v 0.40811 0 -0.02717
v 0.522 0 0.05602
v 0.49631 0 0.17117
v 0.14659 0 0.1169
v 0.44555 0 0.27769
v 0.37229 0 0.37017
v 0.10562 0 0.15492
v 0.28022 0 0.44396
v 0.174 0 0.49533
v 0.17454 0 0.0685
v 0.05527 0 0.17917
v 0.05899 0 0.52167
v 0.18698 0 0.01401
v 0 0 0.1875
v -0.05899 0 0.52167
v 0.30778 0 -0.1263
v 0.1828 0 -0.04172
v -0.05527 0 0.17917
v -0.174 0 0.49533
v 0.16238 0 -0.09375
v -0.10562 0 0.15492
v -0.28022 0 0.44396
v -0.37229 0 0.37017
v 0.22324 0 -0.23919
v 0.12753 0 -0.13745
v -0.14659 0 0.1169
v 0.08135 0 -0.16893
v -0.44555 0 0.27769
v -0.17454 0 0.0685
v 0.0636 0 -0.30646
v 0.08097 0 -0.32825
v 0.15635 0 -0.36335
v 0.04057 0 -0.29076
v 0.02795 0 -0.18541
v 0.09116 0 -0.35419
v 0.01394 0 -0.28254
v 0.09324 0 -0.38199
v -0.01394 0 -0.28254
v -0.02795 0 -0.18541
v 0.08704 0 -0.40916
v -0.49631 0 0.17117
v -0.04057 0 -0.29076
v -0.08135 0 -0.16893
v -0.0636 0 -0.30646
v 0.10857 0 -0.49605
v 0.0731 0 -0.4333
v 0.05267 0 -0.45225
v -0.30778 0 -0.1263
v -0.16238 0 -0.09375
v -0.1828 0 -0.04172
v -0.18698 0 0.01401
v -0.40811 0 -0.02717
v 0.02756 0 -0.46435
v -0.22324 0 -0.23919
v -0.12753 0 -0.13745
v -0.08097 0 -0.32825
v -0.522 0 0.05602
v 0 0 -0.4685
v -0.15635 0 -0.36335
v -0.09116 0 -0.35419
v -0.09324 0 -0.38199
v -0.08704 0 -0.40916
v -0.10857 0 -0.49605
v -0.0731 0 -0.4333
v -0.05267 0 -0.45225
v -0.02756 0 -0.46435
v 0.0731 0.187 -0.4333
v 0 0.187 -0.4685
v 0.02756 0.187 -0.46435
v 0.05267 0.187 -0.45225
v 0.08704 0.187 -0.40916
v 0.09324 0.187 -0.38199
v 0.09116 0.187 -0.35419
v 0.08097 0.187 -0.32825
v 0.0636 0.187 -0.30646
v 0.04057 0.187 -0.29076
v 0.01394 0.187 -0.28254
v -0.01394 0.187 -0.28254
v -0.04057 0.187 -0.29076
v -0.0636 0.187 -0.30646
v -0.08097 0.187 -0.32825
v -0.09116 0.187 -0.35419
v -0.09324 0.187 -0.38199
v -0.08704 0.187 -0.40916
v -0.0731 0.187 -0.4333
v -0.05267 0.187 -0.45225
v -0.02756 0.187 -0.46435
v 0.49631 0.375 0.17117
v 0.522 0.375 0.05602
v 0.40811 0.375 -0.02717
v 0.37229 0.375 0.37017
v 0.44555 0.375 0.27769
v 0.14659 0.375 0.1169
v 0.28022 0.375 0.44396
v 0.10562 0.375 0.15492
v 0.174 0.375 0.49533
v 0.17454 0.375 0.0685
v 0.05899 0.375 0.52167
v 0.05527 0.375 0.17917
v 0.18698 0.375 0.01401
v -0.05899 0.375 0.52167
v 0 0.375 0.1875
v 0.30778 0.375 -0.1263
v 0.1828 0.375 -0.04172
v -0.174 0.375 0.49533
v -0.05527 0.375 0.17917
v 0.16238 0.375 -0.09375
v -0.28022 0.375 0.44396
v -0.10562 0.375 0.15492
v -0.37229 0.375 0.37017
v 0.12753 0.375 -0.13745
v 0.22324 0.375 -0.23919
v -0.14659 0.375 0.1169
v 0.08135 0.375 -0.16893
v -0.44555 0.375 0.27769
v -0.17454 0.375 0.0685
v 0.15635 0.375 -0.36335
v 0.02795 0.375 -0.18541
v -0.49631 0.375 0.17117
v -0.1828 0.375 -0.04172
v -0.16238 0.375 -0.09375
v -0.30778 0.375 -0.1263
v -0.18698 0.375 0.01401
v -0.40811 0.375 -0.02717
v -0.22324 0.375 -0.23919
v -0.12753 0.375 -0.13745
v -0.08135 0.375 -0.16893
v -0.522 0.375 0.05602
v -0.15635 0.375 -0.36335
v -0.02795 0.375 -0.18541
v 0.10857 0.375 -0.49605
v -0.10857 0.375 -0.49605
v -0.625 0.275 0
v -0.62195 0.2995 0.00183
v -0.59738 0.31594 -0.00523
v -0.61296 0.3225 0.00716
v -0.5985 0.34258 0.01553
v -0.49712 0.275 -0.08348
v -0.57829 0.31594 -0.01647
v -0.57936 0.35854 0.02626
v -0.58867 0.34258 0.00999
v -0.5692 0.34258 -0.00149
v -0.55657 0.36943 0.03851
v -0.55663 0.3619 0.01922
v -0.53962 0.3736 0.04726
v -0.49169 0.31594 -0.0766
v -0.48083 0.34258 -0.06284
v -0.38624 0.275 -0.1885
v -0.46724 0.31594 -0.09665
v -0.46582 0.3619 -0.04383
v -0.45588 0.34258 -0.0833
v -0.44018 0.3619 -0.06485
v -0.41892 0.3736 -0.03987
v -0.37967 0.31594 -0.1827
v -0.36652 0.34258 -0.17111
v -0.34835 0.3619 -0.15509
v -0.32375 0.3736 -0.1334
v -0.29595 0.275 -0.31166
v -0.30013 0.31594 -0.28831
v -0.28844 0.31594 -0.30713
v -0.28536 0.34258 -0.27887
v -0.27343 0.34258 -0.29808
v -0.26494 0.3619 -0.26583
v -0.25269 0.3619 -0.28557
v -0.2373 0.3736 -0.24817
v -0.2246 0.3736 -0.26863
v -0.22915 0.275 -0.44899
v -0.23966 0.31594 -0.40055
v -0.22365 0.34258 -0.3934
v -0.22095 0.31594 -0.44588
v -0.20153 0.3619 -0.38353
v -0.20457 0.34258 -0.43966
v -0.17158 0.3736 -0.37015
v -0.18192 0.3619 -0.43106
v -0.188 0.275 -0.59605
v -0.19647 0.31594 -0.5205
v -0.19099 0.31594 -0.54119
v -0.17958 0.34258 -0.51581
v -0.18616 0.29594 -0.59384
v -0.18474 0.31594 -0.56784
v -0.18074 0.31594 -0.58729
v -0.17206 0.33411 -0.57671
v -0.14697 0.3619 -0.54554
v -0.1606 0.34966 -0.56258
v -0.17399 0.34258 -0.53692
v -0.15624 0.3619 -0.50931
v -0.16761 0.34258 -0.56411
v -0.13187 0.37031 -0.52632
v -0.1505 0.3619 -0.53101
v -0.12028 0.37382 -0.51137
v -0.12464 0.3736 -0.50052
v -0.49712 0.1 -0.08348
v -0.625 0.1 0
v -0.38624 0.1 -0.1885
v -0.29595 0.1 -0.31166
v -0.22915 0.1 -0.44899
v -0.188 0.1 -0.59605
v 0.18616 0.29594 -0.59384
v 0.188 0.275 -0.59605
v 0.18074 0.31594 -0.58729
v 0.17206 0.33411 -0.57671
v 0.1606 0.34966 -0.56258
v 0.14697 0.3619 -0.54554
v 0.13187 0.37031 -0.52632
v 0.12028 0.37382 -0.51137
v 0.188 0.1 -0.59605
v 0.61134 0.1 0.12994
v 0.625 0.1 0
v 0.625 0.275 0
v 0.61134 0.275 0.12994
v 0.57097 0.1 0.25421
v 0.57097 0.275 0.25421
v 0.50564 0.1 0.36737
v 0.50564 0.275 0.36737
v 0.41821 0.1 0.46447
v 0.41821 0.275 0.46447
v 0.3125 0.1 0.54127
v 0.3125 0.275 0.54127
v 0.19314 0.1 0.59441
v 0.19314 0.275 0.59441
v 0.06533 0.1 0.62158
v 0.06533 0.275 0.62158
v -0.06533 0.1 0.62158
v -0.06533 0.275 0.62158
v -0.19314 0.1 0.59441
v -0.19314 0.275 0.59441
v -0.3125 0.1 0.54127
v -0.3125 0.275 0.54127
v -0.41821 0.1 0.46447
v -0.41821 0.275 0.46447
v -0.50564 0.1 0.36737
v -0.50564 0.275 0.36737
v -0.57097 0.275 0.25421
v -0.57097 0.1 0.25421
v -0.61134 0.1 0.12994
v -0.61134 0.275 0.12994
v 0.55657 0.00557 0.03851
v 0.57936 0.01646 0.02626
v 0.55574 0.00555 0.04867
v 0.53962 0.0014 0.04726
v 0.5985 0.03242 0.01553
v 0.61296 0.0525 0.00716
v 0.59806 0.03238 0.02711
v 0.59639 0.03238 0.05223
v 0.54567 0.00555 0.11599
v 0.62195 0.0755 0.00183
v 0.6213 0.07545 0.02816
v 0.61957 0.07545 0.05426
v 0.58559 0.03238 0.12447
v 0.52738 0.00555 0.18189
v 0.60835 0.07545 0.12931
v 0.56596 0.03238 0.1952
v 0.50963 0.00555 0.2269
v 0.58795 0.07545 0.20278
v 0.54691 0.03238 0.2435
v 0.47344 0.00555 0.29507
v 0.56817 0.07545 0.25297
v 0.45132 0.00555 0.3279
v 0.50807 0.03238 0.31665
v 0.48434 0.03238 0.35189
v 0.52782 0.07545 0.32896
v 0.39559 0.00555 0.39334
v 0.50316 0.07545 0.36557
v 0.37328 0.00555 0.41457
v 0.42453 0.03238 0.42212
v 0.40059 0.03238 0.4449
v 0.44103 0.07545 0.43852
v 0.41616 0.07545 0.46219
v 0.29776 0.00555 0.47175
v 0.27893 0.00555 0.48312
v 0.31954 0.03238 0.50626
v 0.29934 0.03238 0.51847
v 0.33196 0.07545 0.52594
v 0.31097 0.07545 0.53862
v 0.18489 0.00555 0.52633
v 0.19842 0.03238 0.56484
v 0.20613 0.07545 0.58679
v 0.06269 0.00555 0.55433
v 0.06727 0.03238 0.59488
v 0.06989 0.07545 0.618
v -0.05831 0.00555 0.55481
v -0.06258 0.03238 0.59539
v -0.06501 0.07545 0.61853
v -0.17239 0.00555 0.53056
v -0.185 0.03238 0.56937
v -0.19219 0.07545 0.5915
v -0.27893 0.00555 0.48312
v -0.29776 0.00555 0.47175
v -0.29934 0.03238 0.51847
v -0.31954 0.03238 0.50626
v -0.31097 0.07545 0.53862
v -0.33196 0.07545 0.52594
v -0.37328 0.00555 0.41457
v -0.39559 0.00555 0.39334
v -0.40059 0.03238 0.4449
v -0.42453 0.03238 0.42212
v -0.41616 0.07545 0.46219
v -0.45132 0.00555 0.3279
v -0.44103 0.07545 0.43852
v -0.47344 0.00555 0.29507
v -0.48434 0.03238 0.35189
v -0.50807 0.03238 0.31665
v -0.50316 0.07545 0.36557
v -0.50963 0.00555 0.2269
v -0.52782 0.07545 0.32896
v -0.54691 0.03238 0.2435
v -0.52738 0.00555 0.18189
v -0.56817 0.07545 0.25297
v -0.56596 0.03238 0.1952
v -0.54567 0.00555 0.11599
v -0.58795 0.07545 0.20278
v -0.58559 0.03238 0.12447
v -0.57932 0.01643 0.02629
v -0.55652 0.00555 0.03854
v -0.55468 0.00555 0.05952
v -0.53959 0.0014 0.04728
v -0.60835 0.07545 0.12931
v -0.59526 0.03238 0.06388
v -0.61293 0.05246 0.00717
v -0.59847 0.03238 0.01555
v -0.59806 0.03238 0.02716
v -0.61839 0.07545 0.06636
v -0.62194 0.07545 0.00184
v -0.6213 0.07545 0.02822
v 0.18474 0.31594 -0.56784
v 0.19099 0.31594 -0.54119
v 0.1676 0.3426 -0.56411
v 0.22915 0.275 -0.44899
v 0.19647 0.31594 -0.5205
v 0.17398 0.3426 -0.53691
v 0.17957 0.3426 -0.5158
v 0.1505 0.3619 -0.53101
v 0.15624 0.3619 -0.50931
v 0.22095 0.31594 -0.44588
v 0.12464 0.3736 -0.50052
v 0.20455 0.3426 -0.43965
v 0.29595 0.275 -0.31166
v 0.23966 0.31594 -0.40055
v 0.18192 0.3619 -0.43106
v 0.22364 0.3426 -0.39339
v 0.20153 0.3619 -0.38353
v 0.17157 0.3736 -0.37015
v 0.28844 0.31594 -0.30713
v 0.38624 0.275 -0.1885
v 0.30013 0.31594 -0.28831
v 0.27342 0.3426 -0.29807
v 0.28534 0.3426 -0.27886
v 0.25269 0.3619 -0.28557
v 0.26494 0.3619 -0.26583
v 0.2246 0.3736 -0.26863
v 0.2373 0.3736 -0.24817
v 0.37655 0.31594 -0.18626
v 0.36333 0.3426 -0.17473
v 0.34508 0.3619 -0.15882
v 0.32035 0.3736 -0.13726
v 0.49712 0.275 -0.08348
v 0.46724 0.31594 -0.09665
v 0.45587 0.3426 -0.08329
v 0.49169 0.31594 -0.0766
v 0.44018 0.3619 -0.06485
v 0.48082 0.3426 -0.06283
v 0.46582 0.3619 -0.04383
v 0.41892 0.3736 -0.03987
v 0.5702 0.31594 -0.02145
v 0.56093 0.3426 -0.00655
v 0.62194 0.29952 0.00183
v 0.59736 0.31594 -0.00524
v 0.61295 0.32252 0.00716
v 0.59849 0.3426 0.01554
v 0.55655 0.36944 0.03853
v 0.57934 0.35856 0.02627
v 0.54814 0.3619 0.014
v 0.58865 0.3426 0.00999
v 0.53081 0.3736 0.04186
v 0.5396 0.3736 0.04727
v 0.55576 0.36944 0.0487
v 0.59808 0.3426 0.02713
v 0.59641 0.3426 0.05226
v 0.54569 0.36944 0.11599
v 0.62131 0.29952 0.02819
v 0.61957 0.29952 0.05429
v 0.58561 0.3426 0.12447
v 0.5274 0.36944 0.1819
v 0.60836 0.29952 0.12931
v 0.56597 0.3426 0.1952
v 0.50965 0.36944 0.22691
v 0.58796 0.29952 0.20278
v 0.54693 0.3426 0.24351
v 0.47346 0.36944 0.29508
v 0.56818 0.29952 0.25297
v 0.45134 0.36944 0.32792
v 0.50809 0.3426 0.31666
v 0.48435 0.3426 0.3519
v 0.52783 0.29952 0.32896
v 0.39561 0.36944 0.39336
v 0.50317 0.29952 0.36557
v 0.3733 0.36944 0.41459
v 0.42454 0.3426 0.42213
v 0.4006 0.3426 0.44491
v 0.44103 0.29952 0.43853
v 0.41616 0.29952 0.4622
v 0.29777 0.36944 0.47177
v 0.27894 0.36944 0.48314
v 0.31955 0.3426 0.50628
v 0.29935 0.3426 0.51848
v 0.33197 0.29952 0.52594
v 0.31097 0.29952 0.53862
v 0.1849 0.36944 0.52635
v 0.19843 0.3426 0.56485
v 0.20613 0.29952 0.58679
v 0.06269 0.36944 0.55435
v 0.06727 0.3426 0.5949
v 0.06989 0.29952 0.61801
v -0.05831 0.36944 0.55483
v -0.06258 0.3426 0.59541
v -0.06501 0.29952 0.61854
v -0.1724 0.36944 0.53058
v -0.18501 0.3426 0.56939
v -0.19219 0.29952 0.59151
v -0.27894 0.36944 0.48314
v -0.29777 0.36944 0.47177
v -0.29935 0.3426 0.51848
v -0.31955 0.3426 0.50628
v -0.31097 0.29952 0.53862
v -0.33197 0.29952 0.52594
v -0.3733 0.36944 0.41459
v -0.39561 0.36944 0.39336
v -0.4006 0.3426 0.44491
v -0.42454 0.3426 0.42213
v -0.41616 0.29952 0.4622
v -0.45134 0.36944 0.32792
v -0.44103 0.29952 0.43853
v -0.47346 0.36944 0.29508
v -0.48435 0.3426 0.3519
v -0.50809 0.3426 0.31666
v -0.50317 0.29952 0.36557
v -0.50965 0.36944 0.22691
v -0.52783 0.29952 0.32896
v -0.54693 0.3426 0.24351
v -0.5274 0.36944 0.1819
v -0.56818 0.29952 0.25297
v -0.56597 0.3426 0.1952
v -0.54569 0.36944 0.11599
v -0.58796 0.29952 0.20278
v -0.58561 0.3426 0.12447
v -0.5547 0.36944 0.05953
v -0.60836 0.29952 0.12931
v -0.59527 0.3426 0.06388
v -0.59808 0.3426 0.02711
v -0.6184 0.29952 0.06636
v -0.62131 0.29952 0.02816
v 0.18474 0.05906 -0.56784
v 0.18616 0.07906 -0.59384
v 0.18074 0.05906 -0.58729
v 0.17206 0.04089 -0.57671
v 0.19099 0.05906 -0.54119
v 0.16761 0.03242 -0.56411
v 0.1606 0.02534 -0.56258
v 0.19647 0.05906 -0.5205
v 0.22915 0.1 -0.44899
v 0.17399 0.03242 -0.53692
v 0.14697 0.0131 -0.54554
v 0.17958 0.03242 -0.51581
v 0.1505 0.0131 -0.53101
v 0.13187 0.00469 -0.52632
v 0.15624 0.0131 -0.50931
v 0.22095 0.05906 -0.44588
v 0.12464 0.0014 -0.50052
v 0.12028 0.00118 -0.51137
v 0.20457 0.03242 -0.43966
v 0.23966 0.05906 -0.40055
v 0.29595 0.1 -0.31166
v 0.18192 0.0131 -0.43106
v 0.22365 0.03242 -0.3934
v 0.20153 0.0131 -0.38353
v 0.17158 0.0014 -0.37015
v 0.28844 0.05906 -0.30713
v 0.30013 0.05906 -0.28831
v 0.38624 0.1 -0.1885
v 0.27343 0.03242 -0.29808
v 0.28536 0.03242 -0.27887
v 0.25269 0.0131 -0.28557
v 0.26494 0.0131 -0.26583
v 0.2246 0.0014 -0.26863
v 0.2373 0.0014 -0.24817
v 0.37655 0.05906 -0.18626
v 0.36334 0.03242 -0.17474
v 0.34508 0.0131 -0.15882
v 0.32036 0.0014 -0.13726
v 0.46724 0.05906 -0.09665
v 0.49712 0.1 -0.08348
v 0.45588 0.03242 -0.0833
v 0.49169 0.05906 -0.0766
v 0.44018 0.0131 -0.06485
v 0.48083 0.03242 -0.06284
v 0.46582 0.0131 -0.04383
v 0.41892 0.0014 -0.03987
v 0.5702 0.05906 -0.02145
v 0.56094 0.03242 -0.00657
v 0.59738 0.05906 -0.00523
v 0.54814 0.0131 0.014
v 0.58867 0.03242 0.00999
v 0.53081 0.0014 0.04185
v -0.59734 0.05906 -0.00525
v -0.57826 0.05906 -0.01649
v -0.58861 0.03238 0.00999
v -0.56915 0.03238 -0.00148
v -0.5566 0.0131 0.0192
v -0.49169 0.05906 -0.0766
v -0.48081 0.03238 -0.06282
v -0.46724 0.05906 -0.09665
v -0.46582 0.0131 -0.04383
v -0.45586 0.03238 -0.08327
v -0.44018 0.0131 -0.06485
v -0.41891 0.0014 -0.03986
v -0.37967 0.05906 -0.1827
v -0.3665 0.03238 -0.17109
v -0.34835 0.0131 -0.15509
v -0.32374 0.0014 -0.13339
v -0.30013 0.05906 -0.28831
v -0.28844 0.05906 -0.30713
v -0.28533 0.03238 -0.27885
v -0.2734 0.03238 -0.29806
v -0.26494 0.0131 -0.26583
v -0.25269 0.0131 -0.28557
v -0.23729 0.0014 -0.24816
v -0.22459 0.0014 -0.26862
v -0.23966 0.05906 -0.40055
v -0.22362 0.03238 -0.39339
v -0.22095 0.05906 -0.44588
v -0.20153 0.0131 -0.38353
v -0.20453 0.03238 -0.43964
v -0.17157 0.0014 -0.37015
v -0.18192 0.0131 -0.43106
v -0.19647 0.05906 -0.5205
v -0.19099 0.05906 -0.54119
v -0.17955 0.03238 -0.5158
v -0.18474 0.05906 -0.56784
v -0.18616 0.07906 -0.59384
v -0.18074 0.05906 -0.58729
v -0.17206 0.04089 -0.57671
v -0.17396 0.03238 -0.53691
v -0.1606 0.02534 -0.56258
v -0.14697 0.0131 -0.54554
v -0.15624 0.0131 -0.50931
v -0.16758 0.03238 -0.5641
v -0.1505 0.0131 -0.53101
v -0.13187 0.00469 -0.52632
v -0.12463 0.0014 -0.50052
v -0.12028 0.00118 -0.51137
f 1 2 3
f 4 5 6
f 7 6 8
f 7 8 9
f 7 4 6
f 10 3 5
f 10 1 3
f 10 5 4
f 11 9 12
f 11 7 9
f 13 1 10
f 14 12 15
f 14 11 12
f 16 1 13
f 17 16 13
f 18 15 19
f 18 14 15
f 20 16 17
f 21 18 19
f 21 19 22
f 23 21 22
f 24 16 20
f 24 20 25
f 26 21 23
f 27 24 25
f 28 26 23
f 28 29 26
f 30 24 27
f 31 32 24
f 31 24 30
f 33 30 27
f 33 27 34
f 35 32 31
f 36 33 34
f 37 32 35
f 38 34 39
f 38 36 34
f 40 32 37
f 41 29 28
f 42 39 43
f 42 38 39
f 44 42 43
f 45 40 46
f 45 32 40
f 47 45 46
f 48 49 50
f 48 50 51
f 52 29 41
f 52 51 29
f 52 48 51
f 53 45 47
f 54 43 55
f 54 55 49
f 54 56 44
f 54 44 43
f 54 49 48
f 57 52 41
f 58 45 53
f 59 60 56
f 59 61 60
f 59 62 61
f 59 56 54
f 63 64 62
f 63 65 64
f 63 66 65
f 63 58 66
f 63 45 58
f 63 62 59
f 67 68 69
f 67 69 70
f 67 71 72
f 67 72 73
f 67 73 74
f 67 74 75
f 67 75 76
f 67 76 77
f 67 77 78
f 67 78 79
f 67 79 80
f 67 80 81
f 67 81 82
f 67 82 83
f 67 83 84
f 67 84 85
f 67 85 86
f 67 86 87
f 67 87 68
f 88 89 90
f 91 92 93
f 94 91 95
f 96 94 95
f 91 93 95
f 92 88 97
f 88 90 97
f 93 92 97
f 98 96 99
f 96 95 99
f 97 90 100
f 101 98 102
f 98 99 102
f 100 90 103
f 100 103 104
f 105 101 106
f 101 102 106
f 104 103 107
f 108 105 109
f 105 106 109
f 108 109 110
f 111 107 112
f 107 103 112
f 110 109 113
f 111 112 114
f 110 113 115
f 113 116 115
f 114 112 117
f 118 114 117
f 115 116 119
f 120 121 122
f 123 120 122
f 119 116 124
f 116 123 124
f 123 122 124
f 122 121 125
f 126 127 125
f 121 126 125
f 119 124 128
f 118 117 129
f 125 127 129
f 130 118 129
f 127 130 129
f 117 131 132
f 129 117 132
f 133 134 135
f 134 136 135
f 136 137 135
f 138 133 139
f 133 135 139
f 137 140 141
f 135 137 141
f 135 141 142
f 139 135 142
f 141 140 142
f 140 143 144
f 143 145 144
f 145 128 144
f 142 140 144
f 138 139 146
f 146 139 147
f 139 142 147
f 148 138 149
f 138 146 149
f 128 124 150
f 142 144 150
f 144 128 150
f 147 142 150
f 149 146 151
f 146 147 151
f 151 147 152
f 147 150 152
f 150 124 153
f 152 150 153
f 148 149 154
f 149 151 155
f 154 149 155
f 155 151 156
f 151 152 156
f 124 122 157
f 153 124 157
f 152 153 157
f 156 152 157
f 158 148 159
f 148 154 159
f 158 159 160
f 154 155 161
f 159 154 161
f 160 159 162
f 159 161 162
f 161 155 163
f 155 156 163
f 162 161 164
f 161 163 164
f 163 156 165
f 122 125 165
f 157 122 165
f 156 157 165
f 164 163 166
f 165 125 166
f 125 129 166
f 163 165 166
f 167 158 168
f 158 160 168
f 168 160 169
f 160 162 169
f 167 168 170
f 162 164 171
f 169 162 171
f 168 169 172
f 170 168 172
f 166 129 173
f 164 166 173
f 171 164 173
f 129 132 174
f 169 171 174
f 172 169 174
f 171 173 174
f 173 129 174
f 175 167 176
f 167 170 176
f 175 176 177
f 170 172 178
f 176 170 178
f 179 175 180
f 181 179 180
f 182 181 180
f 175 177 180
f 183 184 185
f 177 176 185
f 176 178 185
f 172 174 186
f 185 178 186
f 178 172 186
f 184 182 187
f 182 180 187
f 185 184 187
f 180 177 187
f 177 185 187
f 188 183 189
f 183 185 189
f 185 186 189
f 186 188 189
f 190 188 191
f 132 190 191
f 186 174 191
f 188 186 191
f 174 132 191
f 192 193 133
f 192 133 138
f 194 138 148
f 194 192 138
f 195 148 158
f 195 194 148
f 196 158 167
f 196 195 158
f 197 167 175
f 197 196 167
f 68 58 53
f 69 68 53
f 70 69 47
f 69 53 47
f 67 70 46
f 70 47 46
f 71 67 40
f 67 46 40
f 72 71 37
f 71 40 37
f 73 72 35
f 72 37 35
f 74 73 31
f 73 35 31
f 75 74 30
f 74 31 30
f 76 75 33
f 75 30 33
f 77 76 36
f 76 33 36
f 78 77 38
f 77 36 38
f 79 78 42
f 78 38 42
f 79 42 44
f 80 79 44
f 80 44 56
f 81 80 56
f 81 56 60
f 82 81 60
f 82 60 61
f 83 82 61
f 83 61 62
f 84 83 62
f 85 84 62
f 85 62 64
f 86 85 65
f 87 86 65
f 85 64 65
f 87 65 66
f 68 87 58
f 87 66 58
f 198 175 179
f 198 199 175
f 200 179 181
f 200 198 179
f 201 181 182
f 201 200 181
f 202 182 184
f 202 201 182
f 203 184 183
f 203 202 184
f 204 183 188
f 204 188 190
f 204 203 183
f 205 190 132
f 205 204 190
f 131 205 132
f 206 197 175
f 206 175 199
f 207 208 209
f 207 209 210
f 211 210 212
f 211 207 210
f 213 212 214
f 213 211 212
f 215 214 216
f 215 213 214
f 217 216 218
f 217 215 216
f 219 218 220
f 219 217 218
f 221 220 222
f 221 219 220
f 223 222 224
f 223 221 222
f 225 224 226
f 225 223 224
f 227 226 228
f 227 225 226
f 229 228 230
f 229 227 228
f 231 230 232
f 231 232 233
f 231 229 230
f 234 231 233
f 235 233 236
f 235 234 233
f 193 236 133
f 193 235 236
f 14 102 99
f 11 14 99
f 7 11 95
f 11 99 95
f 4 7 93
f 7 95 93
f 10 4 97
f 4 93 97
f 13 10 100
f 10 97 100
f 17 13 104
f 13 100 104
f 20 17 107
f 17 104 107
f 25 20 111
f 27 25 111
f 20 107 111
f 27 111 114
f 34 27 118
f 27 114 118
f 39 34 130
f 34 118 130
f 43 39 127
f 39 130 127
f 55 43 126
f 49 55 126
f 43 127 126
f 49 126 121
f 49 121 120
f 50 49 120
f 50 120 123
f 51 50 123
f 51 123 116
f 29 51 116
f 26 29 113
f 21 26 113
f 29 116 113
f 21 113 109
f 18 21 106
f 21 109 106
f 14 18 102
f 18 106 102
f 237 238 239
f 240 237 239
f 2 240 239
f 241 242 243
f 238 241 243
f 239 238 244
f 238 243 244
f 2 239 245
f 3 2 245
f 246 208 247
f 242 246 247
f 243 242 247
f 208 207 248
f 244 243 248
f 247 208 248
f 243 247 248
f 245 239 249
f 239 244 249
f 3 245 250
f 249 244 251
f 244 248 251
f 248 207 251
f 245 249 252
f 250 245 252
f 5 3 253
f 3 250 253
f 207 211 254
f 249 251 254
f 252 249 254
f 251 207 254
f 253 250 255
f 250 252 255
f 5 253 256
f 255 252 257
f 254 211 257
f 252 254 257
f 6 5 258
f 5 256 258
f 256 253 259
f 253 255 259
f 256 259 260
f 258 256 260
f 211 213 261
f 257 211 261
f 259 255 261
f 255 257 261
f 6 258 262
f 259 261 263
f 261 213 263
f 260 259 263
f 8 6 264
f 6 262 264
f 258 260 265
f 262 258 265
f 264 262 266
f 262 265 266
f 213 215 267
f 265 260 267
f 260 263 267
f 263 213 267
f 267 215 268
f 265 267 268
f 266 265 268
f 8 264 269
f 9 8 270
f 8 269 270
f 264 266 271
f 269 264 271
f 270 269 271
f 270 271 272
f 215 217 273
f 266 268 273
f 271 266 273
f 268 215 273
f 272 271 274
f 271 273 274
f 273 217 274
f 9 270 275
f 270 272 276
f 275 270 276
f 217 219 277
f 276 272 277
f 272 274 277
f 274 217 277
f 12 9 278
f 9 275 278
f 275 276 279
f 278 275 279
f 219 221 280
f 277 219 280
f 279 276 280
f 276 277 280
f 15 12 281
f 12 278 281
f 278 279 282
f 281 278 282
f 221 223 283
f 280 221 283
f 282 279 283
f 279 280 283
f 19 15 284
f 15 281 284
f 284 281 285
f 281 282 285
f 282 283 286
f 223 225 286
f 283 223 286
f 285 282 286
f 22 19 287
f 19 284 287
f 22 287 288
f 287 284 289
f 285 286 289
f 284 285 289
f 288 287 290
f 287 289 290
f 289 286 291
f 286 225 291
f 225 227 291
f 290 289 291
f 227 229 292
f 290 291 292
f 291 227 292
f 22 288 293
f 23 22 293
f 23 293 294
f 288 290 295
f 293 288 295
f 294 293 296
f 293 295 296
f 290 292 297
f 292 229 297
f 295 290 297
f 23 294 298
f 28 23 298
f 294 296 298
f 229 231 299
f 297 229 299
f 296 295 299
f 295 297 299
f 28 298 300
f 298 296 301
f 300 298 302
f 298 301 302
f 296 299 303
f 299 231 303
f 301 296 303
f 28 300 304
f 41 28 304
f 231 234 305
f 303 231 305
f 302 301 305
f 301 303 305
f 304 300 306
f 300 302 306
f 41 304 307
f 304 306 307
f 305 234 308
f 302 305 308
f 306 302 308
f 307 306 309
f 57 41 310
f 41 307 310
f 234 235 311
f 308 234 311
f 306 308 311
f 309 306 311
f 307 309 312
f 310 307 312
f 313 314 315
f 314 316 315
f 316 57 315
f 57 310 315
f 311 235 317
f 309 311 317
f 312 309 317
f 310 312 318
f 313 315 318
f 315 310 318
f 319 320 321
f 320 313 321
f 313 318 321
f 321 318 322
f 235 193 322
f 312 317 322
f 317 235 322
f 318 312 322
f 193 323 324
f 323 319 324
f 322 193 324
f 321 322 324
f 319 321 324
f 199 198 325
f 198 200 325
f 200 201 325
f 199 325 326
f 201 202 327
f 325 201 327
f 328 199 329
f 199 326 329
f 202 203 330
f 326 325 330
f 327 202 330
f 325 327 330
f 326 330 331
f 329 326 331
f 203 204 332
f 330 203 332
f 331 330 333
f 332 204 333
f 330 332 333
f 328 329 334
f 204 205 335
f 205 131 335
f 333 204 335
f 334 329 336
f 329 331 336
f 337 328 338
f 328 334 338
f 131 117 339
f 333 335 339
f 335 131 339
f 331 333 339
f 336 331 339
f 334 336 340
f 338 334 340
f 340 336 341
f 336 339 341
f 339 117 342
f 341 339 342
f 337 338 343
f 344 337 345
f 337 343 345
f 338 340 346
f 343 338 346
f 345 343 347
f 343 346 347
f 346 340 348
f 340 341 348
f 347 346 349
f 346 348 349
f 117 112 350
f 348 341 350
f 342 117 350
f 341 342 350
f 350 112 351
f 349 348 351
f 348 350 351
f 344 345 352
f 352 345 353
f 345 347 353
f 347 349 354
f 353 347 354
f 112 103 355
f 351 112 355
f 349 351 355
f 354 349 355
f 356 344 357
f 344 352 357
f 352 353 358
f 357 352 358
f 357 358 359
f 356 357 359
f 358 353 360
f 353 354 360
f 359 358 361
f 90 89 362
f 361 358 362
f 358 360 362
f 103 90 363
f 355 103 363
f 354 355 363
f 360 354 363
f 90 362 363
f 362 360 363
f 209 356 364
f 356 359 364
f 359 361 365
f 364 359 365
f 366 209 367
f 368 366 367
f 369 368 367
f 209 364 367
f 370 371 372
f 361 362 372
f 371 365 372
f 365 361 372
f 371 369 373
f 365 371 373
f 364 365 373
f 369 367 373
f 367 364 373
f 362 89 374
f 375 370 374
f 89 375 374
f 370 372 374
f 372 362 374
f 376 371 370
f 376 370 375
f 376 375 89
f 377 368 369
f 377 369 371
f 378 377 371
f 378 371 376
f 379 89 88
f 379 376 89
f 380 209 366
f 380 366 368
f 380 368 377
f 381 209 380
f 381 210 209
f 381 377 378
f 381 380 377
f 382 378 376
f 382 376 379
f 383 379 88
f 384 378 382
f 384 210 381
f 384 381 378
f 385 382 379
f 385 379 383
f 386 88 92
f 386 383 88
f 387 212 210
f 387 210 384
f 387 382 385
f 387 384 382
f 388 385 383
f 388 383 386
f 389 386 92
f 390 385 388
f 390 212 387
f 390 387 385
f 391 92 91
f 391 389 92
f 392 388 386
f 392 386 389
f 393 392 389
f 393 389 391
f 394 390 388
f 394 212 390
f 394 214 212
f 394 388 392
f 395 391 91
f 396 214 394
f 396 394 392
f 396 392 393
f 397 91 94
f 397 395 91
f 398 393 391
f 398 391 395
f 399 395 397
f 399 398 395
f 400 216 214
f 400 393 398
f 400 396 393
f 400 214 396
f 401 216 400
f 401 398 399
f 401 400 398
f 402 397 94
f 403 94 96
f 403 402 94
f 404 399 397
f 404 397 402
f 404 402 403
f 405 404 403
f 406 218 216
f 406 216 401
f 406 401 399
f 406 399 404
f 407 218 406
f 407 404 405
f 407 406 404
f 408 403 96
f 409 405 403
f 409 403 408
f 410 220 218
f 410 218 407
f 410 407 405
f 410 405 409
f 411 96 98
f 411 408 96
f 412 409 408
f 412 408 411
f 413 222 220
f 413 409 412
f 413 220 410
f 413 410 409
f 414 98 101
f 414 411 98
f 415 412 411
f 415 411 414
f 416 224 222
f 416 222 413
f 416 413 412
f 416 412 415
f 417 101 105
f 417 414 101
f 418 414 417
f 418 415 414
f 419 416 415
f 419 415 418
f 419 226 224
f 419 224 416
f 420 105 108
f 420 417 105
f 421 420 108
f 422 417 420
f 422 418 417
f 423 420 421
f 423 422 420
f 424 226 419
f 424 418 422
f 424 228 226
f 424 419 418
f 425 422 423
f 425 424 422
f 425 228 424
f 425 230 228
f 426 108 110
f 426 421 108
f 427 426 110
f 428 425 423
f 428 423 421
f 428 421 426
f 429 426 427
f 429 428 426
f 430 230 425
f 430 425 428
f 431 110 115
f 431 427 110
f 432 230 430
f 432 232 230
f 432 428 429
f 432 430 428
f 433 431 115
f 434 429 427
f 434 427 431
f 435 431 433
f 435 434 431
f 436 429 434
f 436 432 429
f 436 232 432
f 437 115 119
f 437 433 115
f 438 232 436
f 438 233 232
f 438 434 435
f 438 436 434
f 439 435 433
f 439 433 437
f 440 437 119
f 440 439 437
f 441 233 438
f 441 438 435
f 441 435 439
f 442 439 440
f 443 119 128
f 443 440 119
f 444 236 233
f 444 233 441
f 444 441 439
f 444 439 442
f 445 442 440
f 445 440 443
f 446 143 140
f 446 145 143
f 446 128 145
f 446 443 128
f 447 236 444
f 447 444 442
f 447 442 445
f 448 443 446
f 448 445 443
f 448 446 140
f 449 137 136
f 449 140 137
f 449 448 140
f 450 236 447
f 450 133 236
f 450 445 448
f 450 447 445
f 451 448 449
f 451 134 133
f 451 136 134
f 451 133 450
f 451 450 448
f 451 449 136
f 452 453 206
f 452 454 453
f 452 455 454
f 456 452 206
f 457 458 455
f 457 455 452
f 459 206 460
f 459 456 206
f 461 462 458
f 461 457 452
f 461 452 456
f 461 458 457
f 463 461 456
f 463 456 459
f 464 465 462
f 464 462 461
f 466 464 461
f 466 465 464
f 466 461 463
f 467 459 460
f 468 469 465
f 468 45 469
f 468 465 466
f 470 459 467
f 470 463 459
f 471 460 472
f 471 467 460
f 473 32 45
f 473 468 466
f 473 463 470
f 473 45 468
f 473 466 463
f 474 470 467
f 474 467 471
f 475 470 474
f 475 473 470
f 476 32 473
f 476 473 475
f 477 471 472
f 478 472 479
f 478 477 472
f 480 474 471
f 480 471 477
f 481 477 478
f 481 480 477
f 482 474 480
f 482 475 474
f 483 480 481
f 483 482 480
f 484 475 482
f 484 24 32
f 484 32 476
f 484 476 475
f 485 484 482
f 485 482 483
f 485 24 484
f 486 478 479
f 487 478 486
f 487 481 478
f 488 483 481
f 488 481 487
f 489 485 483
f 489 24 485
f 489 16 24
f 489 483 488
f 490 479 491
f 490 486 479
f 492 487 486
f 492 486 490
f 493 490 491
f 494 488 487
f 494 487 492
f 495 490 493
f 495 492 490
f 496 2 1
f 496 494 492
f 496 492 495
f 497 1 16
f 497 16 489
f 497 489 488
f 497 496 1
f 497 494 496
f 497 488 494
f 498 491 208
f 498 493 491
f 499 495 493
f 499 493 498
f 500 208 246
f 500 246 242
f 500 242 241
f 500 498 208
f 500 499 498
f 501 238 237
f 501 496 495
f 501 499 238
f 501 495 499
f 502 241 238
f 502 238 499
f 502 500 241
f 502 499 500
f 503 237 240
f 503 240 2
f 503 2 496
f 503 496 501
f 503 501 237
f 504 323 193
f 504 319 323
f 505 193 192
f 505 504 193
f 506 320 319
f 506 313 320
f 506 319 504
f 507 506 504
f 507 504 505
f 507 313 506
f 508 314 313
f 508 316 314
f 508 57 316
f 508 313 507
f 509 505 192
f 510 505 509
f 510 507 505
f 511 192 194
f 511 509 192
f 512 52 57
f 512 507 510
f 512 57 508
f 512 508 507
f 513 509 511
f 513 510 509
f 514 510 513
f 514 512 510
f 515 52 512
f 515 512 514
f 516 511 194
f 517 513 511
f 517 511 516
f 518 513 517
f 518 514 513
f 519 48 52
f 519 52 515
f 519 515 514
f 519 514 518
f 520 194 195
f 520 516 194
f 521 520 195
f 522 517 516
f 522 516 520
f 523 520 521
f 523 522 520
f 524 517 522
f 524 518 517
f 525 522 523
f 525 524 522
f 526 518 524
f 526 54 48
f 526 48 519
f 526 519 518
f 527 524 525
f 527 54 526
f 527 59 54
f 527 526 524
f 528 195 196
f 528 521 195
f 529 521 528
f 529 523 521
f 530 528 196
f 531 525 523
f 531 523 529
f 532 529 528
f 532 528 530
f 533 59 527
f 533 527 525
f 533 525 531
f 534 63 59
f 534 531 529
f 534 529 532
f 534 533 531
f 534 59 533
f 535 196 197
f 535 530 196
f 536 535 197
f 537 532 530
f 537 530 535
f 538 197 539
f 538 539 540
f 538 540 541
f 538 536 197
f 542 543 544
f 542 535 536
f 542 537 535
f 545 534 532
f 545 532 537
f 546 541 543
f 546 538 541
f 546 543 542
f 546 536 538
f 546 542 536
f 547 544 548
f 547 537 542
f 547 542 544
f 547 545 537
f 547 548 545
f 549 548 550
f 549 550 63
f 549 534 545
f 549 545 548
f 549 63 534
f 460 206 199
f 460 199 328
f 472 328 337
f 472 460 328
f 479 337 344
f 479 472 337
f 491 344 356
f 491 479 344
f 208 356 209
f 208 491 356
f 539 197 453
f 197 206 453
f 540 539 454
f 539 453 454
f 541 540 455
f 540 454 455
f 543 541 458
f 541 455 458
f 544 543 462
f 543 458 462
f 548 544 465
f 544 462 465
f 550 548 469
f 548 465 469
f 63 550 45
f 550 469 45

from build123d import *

# Parameters (mm, degrees)
BOSS_EXTRUDE1_DEPTH = 0.375
SKETCH2_R           = 0.1875
CUT_EXTRUDE1_DEPTH  = 0.375
FILLET2_R           = 0.1
SKETCH4_R           = 0.0935
CUT_EXTRUDE2_DEPTH  = 0.187


with BuildPart() as part:
    # Sketch1 → Boss-Extrude1 (new body)
    with BuildSketch(Plane(origin=(0, 0, 0), x_dir=(1, 0, 0), z_dir=(0, 1, 0))):
        with BuildLine():
            Line((-0.188, 0.596054528), (0.188, 0.596054528))
            ThreePointArc((0.188, 0.596054528), (0.338325176, 0.248044592), (0.625, 0))
            ThreePointArc((0.625, 0), (0, -0.625), (-0.625, 0))
            ThreePointArc((-0.625, 0), (-0.338325176, 0.248044592), (-0.188, 0.596054528))
        make_face()
    extrude(amount=BOSS_EXTRUDE1_DEPTH)

    # Sketch2 → Cut-Extrude1 (cut)
    with BuildSketch(Plane(origin=(0, 0.375, 0), x_dir=(1, 0, 0), z_dir=(0, 1, 0))):
        with Locations(Location((0, 0, 0), (0, 0, 270))):
            Circle(SKETCH2_R)
    extrude(amount=-CUT_EXTRUDE1_DEPTH, mode=Mode.SUBTRACT)

    # Fillet2
    fillet2_edges = [part.edges().sort_by_distance(p)[0] for p in [
        (0, 0, -0.596054528),
        (0, 0.375, -0.596054528),
        (-0.338325176, 0, -0.248044592),
        (-0.338325176, 0.375, -0.248044592),
        (0.338325176, 0, -0.248044592),
        (0.338325176, 0.375, -0.248044592),
        (0, 0, 0.625),
        (0, 0.375, 0.625),
    ]]
    fillet(fillet2_edges, radius=FILLET2_R)

    # Sketch4 → Cut-Extrude2 (cut)
    with BuildSketch(Plane.XZ):
        with Locations(Location((0, -0.375, 0), (0, 0, 270))):
            Circle(SKETCH4_R)
    extrude(amount=-CUT_EXTRUDE2_DEPTH, mode=Mode.SUBTRACT)


solid = part.part
